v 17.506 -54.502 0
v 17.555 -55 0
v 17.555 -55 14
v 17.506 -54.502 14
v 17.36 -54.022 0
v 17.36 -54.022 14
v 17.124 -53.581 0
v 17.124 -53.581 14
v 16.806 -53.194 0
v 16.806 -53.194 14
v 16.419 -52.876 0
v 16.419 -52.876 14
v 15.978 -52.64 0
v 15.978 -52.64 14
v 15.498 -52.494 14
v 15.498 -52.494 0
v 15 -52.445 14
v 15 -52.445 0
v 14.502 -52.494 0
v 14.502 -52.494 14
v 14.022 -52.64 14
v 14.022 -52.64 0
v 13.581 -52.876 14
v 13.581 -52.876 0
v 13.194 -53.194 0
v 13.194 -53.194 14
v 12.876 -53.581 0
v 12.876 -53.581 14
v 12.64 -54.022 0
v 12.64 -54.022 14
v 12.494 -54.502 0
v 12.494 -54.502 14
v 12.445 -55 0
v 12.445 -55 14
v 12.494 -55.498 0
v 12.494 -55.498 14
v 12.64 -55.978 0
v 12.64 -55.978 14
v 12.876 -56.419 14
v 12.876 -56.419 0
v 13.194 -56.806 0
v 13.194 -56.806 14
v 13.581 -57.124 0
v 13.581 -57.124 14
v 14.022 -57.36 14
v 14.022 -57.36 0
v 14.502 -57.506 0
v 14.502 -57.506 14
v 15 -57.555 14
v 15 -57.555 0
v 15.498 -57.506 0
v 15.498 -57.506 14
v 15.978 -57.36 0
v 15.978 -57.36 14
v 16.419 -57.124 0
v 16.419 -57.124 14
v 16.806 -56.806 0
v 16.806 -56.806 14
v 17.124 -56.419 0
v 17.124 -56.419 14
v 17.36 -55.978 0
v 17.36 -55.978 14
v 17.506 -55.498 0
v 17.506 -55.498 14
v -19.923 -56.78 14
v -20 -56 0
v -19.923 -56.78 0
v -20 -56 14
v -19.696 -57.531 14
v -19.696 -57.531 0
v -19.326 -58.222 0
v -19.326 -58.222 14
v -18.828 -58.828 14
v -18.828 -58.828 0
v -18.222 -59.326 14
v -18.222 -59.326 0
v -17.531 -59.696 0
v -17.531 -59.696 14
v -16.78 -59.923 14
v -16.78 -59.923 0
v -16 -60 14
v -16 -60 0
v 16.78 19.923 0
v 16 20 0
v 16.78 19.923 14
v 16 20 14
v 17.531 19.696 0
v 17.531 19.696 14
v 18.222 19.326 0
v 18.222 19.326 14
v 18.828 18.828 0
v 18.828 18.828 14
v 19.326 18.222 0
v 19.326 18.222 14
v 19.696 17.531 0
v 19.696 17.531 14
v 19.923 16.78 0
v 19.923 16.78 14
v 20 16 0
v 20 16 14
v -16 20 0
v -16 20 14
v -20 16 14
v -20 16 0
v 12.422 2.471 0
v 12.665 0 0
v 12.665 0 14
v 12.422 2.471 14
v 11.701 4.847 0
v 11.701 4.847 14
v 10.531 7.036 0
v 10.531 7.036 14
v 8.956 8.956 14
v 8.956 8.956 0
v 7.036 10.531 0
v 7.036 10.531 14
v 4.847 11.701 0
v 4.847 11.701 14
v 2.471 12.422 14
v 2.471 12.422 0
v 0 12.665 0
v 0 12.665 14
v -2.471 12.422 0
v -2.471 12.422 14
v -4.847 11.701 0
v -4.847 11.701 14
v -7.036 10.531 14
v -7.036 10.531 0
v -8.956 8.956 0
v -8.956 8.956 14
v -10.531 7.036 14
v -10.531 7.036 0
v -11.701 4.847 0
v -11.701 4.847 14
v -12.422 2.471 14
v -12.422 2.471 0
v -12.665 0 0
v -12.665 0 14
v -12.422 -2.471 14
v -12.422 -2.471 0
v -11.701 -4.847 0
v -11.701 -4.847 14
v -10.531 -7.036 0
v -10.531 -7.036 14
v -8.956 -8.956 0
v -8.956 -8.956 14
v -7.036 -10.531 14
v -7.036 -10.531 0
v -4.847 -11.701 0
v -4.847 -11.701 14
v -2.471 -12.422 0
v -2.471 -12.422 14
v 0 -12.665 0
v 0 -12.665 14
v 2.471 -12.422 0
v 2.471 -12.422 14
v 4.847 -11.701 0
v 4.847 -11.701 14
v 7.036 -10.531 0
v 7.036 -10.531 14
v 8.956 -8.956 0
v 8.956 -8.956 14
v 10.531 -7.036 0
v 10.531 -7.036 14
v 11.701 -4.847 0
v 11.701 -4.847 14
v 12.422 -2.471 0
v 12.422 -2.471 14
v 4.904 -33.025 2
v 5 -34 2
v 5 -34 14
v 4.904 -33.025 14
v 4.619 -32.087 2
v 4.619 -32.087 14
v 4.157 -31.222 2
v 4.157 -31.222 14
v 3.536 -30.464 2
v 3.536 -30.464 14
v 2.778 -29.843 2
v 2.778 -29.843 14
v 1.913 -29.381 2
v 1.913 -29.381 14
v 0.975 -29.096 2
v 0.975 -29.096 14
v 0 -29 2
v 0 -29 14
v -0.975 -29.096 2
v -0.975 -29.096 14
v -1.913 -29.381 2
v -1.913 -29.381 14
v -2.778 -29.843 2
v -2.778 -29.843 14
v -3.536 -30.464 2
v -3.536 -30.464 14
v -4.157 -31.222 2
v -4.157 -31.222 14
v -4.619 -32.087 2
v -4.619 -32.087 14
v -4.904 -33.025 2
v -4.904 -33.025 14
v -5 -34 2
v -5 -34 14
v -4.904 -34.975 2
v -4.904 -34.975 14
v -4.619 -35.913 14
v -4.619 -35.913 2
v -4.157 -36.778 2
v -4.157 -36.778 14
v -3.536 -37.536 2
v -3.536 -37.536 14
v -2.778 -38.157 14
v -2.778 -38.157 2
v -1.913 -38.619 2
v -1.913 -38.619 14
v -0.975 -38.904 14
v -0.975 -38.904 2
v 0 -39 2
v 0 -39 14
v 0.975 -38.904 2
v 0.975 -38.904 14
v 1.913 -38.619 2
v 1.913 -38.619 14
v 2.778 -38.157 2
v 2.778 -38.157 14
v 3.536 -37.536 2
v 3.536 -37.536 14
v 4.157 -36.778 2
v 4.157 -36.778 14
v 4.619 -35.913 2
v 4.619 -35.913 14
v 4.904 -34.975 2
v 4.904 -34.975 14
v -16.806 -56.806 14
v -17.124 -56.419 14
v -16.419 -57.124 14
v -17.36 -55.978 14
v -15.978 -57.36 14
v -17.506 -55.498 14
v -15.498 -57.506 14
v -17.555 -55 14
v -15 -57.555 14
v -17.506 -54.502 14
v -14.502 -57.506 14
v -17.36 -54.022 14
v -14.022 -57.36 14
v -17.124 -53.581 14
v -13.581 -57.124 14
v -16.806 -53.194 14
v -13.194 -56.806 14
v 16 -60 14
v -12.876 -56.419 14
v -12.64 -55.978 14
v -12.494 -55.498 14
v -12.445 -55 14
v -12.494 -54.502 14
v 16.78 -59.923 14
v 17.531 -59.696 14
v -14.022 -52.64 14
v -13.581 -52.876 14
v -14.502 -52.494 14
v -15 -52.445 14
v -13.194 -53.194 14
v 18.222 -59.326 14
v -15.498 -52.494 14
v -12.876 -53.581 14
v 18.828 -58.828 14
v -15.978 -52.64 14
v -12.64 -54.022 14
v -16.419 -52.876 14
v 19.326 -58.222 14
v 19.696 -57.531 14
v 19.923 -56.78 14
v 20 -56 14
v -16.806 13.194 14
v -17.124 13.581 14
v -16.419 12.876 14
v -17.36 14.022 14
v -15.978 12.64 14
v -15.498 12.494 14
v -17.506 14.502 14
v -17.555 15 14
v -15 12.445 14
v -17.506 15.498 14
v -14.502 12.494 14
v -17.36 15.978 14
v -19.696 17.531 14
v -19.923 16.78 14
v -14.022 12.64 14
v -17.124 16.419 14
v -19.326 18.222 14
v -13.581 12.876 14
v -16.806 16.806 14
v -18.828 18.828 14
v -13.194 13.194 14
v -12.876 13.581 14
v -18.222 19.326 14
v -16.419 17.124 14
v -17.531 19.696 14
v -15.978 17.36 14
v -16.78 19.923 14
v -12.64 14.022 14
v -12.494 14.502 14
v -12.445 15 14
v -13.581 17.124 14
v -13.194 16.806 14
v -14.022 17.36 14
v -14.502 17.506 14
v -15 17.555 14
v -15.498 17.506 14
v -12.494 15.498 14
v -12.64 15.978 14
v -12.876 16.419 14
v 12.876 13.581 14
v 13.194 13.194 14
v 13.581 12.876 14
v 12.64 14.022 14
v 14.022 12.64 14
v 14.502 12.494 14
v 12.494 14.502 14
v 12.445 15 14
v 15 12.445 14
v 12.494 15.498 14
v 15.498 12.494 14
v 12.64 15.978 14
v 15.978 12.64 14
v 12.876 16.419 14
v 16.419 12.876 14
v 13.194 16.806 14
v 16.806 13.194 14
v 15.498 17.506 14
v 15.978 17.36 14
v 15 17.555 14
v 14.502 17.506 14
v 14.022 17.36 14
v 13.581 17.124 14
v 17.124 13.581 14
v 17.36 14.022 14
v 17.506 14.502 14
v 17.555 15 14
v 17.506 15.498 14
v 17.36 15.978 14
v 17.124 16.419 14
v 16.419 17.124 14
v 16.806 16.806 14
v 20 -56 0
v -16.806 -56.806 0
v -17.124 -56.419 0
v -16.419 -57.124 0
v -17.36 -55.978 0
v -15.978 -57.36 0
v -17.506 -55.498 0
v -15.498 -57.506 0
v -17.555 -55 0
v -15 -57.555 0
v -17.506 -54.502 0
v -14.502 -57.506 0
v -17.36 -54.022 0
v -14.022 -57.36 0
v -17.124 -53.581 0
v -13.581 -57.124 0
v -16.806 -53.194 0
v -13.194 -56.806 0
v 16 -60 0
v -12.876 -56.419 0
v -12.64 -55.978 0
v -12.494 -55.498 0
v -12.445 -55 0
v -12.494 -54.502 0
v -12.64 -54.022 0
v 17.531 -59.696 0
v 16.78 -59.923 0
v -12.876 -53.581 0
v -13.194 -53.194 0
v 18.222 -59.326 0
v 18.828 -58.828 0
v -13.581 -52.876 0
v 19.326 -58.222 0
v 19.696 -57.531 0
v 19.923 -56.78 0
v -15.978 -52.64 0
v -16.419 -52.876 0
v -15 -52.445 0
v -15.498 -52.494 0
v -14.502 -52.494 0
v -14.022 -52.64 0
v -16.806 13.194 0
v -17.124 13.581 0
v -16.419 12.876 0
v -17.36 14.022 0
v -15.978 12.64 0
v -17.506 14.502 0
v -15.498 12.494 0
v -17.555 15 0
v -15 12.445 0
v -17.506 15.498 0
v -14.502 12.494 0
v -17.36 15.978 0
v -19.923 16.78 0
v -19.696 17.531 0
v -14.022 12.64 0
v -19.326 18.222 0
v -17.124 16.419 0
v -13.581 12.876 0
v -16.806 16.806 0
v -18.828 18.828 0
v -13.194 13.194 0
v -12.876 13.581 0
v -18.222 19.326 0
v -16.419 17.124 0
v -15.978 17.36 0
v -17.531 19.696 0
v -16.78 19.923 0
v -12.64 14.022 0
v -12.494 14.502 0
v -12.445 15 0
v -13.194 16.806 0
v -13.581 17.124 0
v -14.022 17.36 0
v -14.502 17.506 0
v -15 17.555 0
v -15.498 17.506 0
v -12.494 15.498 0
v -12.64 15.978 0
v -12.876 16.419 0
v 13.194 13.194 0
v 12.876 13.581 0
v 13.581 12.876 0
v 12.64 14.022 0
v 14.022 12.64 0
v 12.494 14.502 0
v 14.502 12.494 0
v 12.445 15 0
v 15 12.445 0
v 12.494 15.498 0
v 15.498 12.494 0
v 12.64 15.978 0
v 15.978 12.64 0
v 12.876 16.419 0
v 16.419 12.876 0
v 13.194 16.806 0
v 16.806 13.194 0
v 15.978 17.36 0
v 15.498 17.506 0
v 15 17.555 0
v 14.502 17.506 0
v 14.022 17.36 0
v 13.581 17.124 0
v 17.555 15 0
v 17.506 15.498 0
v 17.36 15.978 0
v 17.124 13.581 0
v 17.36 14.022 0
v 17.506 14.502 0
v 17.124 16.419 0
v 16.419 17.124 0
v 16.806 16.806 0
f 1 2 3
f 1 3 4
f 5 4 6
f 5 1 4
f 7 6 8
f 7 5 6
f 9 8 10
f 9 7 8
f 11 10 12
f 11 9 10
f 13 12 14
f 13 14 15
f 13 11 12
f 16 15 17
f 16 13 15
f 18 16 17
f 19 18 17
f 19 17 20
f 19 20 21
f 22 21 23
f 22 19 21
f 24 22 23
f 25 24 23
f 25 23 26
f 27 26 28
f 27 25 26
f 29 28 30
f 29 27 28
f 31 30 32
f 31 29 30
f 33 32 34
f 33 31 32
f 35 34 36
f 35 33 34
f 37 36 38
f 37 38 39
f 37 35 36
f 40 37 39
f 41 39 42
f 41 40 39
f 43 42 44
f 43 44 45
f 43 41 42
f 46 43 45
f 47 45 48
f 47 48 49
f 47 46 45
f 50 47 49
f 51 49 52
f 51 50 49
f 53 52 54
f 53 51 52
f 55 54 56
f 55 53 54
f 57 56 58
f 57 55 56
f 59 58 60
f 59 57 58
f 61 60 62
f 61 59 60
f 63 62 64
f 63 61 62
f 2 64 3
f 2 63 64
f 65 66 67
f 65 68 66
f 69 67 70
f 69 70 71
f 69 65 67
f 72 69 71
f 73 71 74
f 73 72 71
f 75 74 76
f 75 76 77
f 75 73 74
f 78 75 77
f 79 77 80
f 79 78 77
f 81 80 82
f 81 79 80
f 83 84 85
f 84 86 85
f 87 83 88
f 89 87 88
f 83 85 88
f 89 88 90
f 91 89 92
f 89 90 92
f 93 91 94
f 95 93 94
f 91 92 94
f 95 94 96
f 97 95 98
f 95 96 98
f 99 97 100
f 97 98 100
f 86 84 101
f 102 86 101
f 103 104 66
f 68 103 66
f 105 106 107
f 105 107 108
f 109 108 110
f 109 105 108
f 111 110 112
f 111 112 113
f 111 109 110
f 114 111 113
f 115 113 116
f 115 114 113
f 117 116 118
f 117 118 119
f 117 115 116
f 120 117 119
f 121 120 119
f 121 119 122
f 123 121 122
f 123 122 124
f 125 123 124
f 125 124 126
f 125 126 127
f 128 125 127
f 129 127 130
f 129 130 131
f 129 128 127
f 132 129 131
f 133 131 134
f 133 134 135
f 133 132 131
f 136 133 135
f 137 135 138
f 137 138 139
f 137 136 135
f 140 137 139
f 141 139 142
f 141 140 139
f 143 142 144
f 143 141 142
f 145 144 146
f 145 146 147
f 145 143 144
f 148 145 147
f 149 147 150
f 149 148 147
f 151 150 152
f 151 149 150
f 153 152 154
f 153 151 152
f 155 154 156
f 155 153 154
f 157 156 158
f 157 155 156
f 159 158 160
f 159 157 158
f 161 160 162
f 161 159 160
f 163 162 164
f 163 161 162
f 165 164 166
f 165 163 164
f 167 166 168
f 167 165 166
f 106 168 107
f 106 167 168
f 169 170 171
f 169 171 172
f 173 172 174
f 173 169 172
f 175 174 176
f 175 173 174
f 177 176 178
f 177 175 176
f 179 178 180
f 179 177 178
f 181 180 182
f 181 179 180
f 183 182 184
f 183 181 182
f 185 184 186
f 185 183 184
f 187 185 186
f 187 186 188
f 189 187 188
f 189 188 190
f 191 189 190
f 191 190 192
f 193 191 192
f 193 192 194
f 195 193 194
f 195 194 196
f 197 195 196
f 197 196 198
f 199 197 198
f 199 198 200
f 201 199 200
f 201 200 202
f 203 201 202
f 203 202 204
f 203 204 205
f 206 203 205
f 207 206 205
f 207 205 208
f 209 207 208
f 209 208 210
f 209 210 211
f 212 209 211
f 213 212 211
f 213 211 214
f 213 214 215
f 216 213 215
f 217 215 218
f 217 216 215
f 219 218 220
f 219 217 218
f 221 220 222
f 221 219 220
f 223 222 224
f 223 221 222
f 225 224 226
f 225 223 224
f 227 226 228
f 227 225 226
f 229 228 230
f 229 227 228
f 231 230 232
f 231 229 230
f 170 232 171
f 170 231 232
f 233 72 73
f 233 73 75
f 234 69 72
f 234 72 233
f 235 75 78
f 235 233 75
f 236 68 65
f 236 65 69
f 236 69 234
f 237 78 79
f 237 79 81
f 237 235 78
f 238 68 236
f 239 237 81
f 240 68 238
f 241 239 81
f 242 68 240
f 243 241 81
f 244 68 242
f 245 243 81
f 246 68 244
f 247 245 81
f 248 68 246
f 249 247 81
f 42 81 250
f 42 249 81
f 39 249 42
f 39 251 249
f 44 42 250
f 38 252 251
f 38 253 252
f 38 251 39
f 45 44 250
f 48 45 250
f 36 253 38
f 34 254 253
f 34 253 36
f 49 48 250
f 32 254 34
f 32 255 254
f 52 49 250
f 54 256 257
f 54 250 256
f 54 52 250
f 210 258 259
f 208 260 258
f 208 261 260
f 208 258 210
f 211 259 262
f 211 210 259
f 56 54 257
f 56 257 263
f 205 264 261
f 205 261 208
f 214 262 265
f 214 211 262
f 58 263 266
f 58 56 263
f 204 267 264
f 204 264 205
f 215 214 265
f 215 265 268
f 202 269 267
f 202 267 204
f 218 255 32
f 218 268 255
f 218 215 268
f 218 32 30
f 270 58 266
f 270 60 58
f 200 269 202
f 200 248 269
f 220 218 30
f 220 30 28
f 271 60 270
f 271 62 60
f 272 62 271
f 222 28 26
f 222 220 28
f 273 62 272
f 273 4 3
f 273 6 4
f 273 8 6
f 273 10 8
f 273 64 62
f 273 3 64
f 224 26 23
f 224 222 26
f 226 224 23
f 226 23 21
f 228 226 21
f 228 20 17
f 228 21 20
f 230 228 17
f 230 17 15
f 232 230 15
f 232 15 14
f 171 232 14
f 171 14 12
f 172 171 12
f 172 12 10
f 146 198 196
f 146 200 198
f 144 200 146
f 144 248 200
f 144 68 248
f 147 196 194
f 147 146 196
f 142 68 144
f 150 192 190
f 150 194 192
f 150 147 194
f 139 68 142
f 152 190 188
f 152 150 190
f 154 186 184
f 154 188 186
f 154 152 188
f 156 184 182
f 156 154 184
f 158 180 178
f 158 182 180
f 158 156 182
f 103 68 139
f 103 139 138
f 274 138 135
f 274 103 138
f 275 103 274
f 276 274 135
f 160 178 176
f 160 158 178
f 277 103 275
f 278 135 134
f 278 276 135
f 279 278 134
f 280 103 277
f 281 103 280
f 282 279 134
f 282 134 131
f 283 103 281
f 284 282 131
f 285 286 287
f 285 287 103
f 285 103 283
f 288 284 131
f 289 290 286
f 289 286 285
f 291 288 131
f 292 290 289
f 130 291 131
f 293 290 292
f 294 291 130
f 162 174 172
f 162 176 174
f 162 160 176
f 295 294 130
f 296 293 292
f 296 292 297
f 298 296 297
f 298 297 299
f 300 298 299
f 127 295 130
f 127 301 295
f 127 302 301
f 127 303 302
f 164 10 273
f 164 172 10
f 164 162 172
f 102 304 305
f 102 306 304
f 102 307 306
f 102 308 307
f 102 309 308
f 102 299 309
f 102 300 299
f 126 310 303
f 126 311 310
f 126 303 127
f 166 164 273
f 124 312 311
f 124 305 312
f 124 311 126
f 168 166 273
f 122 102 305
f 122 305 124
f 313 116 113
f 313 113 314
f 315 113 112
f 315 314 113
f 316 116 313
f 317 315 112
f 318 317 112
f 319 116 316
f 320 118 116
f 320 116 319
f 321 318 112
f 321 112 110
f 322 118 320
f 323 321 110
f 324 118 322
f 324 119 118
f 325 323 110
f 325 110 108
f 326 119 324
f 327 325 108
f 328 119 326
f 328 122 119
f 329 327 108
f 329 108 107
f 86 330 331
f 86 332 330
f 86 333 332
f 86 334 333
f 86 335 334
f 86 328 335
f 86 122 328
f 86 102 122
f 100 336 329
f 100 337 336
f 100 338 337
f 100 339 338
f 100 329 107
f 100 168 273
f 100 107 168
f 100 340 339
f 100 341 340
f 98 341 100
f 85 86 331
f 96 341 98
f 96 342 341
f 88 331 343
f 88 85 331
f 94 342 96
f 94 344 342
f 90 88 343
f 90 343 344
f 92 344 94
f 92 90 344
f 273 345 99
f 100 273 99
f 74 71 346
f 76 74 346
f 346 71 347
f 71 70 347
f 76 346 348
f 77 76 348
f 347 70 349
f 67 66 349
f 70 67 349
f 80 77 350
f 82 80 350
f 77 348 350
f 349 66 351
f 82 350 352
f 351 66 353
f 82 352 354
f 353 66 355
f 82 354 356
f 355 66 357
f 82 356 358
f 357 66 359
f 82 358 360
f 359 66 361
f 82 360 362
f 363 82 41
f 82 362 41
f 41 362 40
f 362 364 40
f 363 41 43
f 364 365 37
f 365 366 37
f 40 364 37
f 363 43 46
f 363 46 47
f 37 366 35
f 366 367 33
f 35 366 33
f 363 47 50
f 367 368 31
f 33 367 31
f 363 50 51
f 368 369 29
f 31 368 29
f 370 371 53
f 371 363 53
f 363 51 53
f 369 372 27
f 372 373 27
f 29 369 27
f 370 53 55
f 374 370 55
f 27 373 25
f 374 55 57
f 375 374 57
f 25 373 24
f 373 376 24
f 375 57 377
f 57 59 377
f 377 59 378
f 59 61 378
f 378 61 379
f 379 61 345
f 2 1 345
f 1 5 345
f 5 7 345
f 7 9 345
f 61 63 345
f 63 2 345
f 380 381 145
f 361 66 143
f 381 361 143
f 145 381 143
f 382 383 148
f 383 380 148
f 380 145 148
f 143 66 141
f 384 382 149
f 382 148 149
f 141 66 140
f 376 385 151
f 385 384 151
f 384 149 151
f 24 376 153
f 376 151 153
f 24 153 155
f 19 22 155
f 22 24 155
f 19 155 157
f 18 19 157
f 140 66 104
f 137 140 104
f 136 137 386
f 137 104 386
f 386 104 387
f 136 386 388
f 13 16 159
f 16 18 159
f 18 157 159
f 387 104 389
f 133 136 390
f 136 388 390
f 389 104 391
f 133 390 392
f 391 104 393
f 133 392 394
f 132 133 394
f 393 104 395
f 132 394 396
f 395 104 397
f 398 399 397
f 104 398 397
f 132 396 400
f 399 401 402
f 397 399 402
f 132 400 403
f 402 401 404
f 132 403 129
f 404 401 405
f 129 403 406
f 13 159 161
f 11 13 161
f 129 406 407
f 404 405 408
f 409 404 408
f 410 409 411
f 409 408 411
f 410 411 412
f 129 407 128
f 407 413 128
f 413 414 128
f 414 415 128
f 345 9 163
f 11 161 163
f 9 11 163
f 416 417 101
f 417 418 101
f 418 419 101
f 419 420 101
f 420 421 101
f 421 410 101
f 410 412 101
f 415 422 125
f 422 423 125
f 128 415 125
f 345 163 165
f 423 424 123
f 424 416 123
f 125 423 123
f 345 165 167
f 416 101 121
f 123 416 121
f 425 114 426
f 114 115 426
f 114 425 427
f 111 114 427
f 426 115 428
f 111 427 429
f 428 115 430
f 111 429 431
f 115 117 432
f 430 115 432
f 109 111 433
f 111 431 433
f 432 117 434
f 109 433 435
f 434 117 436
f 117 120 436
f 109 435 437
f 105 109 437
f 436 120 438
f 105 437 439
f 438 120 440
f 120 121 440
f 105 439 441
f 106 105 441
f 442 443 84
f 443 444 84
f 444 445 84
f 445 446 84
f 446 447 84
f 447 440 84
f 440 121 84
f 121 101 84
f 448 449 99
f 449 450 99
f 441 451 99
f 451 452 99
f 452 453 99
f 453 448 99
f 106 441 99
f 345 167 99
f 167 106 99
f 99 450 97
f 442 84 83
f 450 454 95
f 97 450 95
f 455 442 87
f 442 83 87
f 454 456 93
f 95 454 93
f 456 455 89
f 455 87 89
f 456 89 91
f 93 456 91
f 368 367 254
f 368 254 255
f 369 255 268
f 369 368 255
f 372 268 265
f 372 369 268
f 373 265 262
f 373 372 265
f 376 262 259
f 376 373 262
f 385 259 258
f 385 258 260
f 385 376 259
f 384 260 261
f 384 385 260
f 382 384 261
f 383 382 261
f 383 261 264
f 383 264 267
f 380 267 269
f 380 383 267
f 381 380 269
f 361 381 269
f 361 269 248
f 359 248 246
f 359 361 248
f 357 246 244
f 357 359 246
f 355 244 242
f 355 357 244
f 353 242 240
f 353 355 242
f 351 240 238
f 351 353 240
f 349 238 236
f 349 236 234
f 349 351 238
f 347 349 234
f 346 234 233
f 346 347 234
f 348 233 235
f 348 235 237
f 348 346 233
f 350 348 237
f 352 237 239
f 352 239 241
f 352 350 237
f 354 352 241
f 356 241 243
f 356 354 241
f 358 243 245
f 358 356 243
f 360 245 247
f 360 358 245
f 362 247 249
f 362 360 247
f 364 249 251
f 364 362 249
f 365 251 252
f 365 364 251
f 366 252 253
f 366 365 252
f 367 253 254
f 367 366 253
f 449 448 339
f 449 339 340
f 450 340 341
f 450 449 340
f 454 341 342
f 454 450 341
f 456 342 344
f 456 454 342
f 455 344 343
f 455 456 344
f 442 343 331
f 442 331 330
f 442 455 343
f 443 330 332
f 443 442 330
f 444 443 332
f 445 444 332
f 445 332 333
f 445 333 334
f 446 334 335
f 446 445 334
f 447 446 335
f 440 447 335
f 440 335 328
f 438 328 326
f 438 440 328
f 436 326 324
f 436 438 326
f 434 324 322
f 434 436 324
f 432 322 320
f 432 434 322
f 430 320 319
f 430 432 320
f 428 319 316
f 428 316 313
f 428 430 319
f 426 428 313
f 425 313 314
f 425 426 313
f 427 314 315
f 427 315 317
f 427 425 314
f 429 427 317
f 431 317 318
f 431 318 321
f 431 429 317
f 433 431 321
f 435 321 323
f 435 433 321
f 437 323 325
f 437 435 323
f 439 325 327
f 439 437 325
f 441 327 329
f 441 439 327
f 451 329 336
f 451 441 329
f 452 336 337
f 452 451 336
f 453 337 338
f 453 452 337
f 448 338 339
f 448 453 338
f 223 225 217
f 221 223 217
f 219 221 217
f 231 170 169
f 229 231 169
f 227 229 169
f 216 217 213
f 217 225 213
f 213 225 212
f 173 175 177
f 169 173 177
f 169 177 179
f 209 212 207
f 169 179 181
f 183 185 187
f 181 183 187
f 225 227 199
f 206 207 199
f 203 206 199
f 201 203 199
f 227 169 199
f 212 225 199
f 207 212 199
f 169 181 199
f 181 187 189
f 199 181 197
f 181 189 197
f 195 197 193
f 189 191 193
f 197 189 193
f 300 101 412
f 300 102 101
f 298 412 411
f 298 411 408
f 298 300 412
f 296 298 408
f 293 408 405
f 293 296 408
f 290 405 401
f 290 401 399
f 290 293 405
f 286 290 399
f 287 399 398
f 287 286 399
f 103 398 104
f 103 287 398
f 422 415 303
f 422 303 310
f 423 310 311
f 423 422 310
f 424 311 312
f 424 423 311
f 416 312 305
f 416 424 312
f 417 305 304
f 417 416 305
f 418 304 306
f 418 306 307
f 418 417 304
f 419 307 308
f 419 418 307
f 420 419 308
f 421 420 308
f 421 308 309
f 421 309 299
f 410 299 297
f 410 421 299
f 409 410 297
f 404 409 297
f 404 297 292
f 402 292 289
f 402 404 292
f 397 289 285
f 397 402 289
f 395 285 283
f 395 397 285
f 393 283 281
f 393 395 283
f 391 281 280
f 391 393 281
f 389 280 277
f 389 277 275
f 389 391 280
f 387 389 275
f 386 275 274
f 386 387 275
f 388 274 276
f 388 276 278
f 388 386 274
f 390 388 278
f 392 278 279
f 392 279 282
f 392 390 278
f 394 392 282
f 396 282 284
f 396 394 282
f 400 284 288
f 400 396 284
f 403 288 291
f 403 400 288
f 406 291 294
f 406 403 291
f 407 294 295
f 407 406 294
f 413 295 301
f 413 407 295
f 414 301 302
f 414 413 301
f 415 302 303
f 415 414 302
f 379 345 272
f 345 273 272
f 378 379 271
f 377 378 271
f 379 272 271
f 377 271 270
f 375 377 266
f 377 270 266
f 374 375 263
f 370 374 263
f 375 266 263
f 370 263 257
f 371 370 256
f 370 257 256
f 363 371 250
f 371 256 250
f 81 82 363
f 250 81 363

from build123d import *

# Parameters (mm, degrees)
SKETCH1_R           = 12.665
SKETCH1_R_2         = 2.554599
SKETCH1_R_3         = 5
BOSS_EXTRUDE1_DEPTH = 14
FILLET1_R           = 4
SKETCH11_R          = 7.5
BOSS_EXTRUDE3_DEPTH = 2


with BuildPart() as part:
    # Sketch1 → Boss-Extrude1 (new body)
    with BuildSketch(Plane.XY):
        Polygon((20, -10), (20, 20), (-20, 20), (-20, -10), (-20, -60), (20, -60), align=None)
        Circle(SKETCH1_R, mode=Mode.SUBTRACT)
        with Locations((-15, 15)):
            Circle(SKETCH1_R_2, mode=Mode.SUBTRACT)
        with Locations((15, 15)):
            Circle(SKETCH1_R_2, mode=Mode.SUBTRACT)
        with Locations((-15, -55)):
            Circle(SKETCH1_R_2, mode=Mode.SUBTRACT)
        with Locations((15, -55)):
            Circle(SKETCH1_R_2, mode=Mode.SUBTRACT)
        with Locations((0, -34)):
            Circle(SKETCH1_R_3, mode=Mode.SUBTRACT)
    extrude(amount=BOSS_EXTRUDE1_DEPTH)

    # Fillet1
    fillet1_edges = [part.edges().sort_by_distance(p)[0] for p in [
        (-20, 20, 7),
        (20, 20, 7),
        (20, -60, 7),
        (-20, -60, 7),
    ]]
    fillet(fillet1_edges, radius=FILLET1_R)

    # Sketch11 → Boss-Extrude3 (add)
    with BuildSketch(Plane(origin=(0, 0, 0), x_dir=(-1, 0, 0), z_dir=(0, 0, -1))):
        with Locations((0, -34)):
            Circle(SKETCH11_R)
    extrude(amount=-BOSS_EXTRUDE3_DEPTH)


solid = part.part
